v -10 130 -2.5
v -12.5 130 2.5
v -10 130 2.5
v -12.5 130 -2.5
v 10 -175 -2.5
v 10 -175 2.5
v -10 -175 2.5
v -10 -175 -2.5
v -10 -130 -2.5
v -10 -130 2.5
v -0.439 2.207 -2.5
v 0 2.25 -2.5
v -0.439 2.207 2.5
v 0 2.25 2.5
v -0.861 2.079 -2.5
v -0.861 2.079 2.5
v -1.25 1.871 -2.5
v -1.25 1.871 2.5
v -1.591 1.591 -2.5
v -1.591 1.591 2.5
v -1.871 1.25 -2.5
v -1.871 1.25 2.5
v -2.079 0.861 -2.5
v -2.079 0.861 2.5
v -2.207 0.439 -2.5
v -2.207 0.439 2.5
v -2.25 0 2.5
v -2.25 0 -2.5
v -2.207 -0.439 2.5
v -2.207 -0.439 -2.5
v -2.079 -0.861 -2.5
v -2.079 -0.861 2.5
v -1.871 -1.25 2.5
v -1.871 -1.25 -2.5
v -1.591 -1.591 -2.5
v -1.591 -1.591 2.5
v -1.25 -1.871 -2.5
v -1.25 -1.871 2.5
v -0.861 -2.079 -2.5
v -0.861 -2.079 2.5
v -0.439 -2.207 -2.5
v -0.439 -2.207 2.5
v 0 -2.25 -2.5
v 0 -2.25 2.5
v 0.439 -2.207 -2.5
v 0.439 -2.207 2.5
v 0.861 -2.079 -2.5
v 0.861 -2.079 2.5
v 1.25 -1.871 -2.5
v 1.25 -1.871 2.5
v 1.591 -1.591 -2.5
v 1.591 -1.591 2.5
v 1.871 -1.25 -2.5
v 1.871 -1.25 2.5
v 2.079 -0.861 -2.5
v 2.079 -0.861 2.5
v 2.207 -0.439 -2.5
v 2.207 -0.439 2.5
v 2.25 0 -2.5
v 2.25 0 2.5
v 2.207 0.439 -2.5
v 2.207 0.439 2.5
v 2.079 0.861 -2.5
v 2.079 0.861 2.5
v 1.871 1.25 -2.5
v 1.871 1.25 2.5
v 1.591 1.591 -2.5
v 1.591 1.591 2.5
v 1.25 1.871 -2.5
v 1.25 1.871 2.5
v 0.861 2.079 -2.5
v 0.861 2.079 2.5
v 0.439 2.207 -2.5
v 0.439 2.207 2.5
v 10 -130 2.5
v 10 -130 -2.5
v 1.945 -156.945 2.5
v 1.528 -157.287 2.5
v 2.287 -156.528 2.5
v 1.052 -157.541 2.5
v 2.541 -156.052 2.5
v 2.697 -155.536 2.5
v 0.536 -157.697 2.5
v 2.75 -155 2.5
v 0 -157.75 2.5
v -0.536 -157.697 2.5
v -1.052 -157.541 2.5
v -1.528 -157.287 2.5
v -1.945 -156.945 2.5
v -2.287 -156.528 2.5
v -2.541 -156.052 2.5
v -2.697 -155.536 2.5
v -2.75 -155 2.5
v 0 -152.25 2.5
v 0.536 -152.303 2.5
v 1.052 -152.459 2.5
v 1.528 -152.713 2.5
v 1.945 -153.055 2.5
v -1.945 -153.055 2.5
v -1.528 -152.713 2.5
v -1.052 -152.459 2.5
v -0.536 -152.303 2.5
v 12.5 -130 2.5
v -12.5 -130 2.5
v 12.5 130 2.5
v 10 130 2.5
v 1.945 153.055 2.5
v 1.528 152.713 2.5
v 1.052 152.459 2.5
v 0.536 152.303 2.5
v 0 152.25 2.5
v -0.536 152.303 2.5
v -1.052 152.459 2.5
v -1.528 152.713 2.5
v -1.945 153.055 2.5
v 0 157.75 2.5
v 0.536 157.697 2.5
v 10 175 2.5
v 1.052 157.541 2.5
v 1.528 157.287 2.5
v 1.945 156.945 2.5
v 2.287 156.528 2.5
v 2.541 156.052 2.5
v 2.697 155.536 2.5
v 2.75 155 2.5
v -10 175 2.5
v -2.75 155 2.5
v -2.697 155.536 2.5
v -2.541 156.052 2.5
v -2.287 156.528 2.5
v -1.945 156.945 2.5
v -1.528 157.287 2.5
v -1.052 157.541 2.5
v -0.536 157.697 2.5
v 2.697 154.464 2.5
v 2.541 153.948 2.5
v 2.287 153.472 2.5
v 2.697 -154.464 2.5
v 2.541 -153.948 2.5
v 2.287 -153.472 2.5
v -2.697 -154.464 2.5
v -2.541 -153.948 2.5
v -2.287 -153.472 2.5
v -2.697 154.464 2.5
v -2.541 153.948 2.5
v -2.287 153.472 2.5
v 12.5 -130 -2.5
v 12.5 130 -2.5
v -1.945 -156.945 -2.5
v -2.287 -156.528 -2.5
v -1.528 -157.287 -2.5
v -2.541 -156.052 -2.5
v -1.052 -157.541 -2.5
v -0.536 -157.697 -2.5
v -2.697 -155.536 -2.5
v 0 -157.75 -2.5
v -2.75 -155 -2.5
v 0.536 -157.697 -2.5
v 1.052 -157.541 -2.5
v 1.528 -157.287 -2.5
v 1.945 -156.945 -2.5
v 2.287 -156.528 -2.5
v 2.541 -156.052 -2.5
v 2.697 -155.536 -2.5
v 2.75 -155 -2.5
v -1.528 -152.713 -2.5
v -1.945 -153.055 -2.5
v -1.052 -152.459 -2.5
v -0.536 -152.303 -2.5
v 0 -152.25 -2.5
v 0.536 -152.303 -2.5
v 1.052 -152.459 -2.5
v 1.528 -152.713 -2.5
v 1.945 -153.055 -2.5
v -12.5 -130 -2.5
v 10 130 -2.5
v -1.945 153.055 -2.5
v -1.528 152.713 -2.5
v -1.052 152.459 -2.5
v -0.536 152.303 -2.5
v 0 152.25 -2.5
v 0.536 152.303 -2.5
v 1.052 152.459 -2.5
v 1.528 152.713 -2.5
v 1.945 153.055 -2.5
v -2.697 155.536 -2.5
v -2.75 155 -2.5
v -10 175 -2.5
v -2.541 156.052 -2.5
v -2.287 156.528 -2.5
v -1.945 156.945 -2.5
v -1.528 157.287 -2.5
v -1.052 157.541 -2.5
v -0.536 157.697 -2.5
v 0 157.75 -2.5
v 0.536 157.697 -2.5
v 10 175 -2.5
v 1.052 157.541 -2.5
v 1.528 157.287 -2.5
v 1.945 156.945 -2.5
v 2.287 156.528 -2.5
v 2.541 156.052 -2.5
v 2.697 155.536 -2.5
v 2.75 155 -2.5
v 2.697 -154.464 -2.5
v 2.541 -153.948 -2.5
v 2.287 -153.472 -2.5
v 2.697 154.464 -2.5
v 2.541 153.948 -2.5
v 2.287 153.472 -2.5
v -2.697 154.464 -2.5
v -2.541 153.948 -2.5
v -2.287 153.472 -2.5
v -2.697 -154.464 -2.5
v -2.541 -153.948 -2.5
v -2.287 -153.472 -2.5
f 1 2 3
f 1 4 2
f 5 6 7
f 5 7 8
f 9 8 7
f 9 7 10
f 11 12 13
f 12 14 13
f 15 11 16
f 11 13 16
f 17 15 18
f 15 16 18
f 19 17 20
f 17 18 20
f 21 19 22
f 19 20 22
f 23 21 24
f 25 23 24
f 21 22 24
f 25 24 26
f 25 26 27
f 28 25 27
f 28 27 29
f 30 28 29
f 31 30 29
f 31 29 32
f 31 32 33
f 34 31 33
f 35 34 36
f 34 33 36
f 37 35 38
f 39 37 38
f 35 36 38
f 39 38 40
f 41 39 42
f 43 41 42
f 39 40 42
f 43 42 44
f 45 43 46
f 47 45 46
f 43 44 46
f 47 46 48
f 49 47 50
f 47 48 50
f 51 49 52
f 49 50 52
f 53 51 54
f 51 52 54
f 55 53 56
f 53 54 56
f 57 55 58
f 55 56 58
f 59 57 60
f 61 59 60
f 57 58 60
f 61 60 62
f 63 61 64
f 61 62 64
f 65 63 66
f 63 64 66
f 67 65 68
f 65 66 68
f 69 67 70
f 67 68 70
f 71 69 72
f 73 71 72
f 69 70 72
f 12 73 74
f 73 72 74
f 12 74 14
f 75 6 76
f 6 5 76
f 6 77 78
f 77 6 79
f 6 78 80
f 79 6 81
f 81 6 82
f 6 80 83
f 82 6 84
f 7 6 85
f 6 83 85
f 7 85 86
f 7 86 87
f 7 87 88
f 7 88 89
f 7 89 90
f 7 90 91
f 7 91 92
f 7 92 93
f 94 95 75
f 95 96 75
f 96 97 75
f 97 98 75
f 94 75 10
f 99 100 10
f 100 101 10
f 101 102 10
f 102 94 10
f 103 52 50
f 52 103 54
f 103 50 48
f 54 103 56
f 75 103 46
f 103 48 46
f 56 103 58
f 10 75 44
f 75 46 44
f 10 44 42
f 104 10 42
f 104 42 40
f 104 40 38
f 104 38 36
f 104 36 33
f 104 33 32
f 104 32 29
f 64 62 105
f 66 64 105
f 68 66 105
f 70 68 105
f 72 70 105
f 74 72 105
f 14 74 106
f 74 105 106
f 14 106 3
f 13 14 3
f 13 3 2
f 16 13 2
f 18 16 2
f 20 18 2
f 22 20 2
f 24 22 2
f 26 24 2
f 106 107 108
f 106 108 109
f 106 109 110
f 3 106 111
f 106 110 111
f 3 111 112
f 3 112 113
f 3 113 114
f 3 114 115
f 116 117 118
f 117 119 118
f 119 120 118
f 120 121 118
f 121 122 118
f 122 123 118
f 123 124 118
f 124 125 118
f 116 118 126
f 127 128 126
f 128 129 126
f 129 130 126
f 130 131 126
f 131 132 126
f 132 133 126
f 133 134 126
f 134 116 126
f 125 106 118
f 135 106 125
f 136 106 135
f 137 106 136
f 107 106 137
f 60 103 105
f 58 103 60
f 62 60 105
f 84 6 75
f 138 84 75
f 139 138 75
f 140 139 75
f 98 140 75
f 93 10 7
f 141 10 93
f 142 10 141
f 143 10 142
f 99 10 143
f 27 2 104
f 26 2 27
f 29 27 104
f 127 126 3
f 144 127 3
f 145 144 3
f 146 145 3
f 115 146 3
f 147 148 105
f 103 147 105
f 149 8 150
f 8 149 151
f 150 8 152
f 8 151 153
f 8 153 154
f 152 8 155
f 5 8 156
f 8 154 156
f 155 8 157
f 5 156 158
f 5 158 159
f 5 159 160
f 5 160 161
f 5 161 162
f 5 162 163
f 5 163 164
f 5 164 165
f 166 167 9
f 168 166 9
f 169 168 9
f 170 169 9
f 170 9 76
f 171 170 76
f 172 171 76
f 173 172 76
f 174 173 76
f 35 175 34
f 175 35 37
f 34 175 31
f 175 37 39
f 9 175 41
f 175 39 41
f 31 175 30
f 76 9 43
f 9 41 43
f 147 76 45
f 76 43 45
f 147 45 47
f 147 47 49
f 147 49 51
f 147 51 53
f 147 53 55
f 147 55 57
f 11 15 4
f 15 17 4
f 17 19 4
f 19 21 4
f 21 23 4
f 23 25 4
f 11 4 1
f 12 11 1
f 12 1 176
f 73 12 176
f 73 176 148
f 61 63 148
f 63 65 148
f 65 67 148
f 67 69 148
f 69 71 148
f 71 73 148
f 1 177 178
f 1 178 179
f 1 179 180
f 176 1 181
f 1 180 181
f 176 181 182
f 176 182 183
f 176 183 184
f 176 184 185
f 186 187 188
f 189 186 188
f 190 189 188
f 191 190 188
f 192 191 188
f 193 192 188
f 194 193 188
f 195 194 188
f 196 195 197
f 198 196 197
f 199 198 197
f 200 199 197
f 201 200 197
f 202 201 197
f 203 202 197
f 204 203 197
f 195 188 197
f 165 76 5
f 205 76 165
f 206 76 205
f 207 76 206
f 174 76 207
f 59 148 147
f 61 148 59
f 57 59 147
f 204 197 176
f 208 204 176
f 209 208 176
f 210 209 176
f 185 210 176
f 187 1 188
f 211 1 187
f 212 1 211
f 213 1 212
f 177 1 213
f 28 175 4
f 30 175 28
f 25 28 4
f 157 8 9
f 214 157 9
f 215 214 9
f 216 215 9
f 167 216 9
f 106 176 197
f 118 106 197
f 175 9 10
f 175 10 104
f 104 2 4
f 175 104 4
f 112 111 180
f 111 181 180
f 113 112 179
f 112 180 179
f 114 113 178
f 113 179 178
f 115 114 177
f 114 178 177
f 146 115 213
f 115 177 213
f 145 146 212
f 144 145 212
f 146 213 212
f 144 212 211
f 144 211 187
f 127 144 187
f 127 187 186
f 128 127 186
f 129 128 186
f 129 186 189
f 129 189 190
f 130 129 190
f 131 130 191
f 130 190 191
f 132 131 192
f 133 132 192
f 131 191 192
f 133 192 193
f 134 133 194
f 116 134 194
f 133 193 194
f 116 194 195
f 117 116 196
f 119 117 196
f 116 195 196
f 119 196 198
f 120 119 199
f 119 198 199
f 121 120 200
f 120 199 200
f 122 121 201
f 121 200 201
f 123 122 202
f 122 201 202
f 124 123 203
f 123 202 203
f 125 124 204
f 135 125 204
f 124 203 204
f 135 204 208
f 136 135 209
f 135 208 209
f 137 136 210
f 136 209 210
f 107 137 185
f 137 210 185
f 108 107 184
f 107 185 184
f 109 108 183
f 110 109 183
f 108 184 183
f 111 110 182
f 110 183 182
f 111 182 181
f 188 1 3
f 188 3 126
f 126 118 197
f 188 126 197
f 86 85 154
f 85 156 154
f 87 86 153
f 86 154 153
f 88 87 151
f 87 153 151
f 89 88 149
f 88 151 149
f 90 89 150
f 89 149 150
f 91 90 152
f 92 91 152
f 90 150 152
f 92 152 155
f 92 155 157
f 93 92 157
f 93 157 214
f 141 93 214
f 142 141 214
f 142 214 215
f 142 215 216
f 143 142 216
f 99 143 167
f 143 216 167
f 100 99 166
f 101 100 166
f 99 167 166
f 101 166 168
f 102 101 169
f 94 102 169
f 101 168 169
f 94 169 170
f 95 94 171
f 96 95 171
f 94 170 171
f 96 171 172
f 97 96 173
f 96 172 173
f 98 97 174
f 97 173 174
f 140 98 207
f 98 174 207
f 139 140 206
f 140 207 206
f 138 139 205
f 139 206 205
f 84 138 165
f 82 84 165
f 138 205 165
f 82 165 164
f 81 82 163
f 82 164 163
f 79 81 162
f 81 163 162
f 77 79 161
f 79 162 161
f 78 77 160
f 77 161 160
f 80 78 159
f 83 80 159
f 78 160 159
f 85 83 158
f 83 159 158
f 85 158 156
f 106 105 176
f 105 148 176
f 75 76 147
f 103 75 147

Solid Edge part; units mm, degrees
sketch "Sketch1" plane through (0, 0, 0) normal (0, -1, 0) x (1, 0, 0)
  line L0 (-12.5, -2.5) -> (12.5, -2.5)
  line L1 (12.5, -2.5) -> (12.5, 2.5)
  line L2 (12.5, 2.5) -> (-12.5, 2.5)
  line L3 (-12.5, 2.5) -> (-12.5, -2.5)
  dimension "D1" = 25
  dimension "D2" = 5
extrude "Protrusion1" add sketch "Sketch1" along normal mid plane 350
sketch "Sketch2" plane through (0, 0, 2.5) normal (0, 0, 1) x (0, 1, 0)
  circle A0 centre (0, 0) radius 2.25
extrude "Cutout1" cut sketch "Sketch2" against normal through all
sketch "Sketch3" plane through (0, 0, -2.5) normal (0, 0, -1) x (0, -1, 0)
  circle A0 centre (-155, 0) radius 2.75
  circle A1 centre (155, 0) radius 2.75
  dimension "D1" = 5.5
  dimension "D2" = 20
  dimension "D3" = 20
extrude "Cutout2" cut sketch "Sketch3" against normal through all
sketch "Sketch4" plane through (0, 0, -2.5) normal (0, 0, -1) x (0, -1, 0)
  line L0 (-175, 12.5) -> (-130, 12.5)
  line L1 (-130, 12.5) -> (-130, 10)
  line L2 (-130, 10) -> (-175, 10)
  line L3 (-175, 10) -> (-175, 12.5)
  line L4 (-175, -12.5) -> (-130, -12.5)
  line L5 (-130, -12.5) -> (-130, -10)
  line L6 (-130, -10) -> (-175, -10)
  line L7 (-175, -10) -> (-175, -12.5)
  dimension "D1" = 45
  dimension "D2" = 20
extrude "Cutout3" cut sketch "Sketch4" against normal through all
mirror "Mirror1" about plane through (0, 0, 0) normal (0, -1, 0) of "Cutout3"
properties material "AlSi7Mg"
